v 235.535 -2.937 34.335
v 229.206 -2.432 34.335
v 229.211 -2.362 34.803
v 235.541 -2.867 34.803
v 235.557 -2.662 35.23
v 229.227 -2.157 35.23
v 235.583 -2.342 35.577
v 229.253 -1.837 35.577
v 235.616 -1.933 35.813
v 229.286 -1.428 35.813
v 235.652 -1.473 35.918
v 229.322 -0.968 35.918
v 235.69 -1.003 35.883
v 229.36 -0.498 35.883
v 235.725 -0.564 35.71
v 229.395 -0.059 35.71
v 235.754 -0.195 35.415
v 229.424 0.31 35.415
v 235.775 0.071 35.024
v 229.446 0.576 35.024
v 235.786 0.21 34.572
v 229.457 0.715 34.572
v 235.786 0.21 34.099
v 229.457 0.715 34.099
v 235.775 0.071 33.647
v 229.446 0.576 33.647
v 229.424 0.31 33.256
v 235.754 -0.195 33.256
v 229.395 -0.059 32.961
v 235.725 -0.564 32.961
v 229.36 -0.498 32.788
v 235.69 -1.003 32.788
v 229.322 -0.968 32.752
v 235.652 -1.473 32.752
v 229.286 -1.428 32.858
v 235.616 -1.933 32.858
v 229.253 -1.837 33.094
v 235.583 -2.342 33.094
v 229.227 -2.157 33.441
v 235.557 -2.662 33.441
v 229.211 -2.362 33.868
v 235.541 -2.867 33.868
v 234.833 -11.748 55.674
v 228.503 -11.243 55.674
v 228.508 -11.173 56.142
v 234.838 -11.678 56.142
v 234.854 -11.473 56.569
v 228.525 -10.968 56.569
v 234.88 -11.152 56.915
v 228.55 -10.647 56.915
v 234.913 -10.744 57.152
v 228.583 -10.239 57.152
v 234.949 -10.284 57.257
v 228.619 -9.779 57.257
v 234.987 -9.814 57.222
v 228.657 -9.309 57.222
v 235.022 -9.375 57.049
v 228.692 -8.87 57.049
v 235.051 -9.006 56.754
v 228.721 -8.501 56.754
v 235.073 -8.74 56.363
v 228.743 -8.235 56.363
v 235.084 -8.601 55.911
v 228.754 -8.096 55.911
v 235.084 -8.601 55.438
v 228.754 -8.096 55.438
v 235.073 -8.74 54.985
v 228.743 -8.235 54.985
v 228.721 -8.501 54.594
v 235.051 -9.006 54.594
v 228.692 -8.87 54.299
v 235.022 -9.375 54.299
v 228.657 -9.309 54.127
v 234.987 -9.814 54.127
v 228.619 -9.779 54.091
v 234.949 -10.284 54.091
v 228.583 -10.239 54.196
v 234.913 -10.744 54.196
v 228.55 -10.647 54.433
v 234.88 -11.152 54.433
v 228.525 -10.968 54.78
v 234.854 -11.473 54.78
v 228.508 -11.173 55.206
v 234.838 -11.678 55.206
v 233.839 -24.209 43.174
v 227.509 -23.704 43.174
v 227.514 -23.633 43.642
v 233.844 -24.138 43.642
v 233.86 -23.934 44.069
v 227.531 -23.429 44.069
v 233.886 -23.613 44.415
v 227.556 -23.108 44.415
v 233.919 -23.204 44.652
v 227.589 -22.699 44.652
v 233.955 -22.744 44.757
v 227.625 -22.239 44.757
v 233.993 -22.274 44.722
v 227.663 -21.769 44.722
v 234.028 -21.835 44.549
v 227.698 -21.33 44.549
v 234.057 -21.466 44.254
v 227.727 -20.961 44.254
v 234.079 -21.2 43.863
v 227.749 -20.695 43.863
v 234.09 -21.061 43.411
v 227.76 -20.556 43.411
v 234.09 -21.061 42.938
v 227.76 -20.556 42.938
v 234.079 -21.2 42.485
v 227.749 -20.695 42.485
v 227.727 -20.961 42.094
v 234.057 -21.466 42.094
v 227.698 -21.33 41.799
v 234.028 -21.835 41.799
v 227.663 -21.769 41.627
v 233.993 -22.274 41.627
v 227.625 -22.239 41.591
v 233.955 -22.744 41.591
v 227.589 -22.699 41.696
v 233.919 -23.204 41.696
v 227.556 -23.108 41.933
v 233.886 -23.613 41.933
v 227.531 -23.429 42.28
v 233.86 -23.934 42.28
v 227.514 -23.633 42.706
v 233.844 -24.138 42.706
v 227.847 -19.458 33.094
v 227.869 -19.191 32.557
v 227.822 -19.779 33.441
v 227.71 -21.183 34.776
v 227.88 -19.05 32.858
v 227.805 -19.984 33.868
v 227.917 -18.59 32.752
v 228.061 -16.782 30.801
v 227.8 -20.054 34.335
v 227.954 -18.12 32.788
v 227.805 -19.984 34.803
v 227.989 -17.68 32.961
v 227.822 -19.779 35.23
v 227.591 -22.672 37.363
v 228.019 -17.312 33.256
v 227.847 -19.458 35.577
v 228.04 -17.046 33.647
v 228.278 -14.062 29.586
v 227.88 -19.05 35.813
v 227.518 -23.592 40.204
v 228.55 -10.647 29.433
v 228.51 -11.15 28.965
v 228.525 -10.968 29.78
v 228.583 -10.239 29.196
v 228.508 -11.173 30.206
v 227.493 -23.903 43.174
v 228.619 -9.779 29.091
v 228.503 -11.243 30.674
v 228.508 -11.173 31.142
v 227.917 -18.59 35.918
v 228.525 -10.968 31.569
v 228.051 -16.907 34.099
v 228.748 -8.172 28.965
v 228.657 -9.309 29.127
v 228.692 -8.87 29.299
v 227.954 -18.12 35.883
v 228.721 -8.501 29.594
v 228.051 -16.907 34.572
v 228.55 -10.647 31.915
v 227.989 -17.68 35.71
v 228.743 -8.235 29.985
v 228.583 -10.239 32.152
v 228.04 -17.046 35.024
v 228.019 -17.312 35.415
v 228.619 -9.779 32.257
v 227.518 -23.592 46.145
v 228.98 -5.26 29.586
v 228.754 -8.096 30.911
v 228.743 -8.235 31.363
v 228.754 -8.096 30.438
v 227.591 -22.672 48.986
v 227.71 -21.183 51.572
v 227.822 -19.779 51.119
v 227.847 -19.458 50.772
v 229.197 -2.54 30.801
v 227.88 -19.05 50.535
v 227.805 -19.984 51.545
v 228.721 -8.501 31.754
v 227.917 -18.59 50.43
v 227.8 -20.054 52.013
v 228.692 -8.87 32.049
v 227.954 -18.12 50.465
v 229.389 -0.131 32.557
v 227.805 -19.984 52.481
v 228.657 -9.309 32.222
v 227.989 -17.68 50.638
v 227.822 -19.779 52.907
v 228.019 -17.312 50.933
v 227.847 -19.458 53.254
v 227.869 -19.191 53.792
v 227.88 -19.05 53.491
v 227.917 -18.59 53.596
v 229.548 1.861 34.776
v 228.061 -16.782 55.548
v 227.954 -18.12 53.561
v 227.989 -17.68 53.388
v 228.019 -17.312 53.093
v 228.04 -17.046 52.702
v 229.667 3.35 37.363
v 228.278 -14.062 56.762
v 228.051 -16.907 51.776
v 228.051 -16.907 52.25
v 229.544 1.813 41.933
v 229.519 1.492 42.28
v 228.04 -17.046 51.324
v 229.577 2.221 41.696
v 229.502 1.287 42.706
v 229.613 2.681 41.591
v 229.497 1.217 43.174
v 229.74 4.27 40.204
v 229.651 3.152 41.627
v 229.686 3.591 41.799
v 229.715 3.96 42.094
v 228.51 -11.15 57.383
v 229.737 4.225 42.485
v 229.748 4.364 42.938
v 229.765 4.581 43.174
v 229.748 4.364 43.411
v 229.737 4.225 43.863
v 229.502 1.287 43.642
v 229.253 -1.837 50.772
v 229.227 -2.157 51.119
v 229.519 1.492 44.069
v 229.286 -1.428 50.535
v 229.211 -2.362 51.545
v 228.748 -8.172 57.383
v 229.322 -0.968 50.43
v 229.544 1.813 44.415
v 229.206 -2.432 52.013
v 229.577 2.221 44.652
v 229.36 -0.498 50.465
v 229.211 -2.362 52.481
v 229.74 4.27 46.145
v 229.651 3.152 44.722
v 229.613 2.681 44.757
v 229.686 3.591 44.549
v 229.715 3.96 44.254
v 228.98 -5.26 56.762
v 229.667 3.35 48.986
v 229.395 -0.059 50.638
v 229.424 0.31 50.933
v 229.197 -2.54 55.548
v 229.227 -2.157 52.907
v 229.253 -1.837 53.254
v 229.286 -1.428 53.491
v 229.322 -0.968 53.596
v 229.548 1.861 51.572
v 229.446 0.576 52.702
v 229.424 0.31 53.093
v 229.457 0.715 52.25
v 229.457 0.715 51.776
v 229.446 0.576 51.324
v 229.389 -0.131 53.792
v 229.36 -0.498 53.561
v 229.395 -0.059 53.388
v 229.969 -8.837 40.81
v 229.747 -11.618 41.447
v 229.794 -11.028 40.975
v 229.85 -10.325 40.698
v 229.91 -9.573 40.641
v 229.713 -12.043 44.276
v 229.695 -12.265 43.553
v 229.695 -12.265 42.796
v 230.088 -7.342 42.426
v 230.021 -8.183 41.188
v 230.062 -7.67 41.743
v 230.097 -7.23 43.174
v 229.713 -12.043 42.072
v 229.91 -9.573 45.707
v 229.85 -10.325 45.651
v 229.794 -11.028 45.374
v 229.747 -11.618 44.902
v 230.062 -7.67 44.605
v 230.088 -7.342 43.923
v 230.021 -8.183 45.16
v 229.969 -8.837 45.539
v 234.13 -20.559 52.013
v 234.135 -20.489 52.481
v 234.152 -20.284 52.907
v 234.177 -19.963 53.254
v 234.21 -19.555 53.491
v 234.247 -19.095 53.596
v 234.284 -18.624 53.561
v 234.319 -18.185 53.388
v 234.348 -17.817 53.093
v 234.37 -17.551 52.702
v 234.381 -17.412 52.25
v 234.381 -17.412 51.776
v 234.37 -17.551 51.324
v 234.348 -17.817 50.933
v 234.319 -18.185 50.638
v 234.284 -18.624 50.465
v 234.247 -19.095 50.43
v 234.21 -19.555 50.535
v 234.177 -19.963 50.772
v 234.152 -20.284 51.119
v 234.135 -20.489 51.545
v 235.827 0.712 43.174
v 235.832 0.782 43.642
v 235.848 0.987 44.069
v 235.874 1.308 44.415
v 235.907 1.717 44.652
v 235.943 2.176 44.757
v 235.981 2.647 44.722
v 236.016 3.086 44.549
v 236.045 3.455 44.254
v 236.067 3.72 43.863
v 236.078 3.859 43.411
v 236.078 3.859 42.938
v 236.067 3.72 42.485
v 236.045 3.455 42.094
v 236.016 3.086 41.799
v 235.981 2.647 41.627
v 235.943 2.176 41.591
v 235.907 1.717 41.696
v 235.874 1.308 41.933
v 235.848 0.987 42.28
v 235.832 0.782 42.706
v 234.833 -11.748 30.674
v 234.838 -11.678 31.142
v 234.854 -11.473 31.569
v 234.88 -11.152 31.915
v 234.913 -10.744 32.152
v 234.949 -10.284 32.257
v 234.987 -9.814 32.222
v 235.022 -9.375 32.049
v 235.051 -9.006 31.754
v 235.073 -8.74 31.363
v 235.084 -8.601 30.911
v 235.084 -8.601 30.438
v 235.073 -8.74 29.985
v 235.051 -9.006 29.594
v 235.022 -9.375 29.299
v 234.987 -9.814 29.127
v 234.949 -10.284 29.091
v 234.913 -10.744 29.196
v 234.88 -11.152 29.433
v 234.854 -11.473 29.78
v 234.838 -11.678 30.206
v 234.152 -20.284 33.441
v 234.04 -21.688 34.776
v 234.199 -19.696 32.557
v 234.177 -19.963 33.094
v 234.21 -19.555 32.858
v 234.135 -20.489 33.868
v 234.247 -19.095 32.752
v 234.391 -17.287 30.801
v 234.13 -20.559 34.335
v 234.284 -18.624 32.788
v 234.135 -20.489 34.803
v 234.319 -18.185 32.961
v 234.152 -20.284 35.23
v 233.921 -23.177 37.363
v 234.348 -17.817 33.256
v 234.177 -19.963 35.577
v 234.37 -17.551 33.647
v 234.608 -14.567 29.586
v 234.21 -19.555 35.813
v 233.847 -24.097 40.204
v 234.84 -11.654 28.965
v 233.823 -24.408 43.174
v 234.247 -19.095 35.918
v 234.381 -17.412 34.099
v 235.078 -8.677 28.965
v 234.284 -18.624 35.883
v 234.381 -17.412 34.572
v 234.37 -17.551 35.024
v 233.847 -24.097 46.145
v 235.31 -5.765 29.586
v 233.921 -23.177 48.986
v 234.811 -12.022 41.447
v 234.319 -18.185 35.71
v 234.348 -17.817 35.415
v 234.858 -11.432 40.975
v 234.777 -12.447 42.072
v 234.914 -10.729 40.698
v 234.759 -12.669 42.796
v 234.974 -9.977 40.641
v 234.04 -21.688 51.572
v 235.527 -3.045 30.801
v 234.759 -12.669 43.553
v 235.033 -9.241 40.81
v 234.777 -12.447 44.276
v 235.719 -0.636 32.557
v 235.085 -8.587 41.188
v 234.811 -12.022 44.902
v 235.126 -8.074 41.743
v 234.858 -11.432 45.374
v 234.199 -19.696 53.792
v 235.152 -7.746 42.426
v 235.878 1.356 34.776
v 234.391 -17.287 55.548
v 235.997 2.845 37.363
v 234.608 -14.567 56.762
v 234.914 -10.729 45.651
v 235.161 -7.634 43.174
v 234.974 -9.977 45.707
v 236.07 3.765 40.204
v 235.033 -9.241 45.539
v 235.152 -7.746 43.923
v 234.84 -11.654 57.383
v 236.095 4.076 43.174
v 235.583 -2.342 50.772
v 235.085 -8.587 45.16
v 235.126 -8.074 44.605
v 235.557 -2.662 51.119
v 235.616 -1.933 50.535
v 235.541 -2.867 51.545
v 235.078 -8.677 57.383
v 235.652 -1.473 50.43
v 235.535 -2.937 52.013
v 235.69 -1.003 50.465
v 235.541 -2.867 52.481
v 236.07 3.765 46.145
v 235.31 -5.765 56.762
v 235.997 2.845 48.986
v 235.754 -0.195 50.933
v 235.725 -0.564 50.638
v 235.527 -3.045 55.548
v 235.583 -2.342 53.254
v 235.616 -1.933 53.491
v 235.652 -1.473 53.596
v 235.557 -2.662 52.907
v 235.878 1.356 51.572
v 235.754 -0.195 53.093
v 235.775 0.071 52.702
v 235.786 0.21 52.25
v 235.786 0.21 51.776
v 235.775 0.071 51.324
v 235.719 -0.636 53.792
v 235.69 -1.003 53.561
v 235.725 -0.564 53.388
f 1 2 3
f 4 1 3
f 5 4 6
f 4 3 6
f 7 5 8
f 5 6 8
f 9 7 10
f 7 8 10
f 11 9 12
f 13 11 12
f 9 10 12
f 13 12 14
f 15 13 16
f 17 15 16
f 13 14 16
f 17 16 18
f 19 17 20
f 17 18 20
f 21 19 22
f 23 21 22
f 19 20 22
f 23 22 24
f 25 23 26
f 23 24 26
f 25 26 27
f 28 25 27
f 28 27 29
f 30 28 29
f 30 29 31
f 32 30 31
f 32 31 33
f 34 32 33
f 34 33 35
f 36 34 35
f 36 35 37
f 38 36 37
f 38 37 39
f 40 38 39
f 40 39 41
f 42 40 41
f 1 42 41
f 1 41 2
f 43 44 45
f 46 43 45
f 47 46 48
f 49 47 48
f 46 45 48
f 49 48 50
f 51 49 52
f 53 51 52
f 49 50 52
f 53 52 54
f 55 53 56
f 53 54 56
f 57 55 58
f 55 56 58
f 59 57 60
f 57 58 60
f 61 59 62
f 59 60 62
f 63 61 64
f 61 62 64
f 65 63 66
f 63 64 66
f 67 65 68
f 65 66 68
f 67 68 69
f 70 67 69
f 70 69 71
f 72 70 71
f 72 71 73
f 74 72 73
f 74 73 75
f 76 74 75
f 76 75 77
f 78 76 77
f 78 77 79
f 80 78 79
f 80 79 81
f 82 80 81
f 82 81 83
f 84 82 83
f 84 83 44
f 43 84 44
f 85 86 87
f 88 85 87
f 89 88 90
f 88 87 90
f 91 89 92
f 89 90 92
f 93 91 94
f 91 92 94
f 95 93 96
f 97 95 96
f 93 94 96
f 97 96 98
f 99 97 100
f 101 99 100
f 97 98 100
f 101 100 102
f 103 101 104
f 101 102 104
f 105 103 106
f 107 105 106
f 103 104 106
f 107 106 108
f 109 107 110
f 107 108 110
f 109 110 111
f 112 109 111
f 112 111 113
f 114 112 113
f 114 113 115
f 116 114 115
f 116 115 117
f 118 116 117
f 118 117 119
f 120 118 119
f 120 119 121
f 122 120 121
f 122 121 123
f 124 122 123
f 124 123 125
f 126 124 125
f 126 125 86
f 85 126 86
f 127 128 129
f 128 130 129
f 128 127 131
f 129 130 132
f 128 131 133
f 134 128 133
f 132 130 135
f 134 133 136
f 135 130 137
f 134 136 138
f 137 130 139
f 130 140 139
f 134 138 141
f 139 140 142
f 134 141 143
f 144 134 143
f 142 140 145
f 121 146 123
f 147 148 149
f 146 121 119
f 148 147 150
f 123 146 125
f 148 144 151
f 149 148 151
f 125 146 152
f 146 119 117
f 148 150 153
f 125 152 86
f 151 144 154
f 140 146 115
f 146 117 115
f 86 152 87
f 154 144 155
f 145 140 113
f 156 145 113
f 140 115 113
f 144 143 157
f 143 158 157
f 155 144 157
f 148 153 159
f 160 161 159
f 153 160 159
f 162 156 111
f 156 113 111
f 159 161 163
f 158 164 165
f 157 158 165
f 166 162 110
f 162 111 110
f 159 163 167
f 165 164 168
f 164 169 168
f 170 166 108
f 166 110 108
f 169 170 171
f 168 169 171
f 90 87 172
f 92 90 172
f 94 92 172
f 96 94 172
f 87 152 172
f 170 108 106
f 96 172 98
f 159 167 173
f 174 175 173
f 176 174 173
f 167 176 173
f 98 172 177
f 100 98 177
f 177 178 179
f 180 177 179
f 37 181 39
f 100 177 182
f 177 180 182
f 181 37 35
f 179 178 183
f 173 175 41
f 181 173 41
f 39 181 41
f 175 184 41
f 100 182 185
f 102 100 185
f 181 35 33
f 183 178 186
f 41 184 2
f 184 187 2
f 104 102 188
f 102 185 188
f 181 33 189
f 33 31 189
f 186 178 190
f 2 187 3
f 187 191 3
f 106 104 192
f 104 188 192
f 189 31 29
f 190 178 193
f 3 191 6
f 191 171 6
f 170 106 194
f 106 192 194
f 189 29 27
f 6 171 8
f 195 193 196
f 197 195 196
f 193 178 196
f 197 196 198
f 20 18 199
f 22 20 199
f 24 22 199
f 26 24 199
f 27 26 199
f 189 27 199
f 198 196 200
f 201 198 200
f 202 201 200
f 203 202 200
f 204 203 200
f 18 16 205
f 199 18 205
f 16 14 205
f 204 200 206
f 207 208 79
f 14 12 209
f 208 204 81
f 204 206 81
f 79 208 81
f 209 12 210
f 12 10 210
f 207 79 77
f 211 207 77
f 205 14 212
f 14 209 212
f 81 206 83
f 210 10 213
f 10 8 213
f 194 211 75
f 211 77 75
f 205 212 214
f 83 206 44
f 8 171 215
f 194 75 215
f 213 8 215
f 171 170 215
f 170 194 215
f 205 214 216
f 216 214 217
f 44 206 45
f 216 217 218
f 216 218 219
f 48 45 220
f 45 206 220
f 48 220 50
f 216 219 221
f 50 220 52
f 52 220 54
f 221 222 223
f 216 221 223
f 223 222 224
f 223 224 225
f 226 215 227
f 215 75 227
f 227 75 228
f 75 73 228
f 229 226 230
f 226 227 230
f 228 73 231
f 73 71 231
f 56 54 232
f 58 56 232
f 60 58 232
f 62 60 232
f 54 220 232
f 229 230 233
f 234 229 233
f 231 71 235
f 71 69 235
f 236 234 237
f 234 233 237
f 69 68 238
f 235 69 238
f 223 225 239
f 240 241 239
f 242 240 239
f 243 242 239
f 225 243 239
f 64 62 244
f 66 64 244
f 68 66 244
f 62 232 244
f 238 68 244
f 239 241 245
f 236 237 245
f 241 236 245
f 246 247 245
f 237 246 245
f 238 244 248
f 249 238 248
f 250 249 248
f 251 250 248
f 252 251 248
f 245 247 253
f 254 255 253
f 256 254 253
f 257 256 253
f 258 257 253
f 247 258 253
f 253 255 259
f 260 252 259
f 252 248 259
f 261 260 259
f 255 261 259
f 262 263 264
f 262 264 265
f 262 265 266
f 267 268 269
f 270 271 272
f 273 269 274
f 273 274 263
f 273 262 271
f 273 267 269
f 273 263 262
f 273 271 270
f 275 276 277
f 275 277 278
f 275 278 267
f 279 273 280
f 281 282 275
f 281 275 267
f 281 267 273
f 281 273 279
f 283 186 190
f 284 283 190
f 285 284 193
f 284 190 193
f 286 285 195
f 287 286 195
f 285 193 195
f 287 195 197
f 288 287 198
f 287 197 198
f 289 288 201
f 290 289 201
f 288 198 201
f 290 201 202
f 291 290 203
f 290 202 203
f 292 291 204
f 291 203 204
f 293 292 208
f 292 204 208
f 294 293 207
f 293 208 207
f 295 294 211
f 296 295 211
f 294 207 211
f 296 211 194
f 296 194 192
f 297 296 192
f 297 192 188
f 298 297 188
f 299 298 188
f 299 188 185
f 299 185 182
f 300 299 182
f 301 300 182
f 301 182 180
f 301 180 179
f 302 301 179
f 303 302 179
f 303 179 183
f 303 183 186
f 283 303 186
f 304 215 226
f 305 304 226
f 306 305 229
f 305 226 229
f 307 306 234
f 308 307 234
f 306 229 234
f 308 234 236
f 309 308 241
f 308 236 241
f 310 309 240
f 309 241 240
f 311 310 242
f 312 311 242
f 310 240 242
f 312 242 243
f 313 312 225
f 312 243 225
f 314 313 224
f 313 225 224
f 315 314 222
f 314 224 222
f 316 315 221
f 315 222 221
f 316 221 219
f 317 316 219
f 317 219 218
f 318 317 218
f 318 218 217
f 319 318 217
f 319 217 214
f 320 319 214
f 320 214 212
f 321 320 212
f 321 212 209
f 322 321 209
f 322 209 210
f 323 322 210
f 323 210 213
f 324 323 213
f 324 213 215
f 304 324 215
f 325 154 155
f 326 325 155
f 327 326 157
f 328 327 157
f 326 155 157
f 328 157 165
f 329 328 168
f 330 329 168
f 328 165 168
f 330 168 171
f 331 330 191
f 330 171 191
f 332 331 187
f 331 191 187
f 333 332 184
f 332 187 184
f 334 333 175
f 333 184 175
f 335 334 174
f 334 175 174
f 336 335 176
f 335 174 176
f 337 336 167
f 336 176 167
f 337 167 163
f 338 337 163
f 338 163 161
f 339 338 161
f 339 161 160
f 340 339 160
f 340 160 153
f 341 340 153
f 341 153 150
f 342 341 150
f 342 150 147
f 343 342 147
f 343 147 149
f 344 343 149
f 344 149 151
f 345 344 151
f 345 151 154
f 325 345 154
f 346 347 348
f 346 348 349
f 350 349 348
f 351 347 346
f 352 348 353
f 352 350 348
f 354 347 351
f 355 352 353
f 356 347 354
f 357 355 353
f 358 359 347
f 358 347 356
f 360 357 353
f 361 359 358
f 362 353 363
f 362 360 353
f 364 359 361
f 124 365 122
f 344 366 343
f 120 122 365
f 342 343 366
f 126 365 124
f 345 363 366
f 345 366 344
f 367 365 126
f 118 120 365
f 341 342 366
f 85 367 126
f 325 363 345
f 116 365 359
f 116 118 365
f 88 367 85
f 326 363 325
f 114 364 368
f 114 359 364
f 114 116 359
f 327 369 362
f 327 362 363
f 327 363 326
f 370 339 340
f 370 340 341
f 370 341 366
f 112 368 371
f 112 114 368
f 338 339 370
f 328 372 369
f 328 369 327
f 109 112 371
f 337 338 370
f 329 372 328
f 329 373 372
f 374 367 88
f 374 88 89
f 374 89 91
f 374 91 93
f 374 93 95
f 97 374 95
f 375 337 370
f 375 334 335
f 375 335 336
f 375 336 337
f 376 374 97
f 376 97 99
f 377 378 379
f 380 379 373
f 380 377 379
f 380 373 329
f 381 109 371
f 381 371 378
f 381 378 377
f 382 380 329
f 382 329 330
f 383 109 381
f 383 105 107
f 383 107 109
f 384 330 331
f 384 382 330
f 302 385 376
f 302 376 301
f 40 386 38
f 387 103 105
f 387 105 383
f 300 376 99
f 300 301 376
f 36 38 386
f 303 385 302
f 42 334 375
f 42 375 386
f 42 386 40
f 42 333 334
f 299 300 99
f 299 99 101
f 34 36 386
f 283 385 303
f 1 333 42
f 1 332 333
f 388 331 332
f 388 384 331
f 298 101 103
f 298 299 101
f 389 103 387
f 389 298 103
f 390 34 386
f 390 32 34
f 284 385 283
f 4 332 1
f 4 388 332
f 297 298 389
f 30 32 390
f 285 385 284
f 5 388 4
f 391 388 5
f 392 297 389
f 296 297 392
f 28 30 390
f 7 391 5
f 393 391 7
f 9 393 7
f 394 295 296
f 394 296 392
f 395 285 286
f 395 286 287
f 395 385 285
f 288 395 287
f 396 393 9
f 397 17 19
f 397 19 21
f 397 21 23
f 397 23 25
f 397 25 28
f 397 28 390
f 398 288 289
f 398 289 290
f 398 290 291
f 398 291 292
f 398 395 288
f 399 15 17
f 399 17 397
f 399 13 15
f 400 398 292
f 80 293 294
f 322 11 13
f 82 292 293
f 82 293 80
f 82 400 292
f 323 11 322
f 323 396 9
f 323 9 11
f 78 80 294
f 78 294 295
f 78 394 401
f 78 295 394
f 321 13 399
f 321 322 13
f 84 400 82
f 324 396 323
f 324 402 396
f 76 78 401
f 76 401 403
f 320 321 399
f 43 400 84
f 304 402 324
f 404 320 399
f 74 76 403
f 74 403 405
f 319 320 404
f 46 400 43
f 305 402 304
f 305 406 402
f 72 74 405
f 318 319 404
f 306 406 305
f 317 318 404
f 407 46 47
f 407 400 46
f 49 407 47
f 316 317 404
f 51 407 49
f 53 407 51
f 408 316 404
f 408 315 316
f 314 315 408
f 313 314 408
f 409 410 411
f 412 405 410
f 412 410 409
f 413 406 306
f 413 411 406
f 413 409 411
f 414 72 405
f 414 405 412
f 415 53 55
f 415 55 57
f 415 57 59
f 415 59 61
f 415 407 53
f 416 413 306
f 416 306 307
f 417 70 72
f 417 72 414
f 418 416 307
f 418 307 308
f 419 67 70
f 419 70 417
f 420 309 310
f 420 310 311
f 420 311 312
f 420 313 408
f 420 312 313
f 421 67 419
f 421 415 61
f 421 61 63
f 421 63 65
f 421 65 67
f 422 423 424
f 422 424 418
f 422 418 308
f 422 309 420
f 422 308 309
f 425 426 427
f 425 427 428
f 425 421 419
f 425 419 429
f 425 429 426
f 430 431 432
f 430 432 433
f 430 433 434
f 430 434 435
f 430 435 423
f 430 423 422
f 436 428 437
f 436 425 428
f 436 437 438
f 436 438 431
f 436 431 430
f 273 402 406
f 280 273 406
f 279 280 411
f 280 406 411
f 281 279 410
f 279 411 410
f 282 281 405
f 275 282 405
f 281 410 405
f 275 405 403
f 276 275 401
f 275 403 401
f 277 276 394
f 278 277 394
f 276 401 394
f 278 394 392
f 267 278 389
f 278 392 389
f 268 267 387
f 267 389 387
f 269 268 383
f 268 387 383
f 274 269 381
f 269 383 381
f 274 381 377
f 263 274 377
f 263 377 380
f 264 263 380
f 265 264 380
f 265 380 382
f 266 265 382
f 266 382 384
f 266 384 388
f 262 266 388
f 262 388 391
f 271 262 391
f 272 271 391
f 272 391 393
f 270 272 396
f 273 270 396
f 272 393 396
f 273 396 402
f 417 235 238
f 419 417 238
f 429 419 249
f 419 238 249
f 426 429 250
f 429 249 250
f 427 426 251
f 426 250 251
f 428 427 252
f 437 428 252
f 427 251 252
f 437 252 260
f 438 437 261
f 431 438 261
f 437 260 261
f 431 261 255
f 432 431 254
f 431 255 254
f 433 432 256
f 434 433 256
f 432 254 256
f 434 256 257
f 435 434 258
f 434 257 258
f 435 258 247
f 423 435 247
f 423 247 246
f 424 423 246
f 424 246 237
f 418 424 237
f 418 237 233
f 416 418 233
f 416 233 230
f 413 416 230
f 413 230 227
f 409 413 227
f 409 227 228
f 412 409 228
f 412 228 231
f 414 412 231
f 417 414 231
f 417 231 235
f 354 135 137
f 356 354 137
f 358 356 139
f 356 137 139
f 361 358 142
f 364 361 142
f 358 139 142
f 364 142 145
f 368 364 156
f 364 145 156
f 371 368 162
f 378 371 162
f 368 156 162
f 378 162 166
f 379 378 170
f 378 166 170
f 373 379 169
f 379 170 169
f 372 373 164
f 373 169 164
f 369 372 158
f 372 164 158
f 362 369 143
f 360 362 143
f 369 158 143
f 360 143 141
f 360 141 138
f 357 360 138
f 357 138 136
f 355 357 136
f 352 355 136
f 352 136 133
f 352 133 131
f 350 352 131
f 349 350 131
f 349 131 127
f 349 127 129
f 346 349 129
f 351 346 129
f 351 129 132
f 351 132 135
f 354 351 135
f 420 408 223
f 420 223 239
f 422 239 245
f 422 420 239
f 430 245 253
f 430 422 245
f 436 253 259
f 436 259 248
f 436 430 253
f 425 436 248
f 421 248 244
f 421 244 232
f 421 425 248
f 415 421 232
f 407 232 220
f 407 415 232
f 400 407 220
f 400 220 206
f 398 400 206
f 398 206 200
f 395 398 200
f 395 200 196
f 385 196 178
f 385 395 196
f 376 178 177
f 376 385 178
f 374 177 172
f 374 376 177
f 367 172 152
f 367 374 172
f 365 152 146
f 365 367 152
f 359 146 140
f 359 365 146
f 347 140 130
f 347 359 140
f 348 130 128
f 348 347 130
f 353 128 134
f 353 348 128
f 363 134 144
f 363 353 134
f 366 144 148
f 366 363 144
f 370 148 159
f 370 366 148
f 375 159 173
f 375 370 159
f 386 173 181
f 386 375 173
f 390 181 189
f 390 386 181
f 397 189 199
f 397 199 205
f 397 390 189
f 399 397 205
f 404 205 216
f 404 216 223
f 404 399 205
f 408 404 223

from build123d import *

# Parameters (mm, degrees)
SKETCH1_R           = 14.2875
BOSS_EXTRUDE1_DEPTH = 6.35
SKETCH2_R           = 2.54
CUT_EXTRUDE1_DEPTH  = 5.08
SKETCH3_R           = 1.5875
CUT_EXTRUDE2_DEPTH  = 10


with BuildPart() as part:
    # Sketch1 → Boss-Extrude1 (new body)
    with BuildSketch(Plane(origin=(234.278878836, -18.689027227, 0), x_dir=(0, 0, -1), z_dir=(0.9968332748770866, -0.0795199477981641, 0))):
        with Locations(Location((-43.174261814, 8.550344032, 0), (0, 0, 90))):
            Circle(SKETCH1_R)
    extrude(amount=-BOSS_EXTRUDE1_DEPTH)

    # Sketch2 → Cut-Extrude1 (cut)
    with BuildSketch(Plane(origin=(234.278878836, -18.689027227, 0), x_dir=(0, 0, -1), z_dir=(0.9968332748770866, -0.07951994779816411, 0))):
        with Locations(Location((-43.174261814, 8.550344032, 0), (0, 0, 90))):
            Circle(SKETCH2_R)
    extrude(amount=-CUT_EXTRUDE1_DEPTH, mode=Mode.SUBTRACT)

    # Sketch3 → Cut-Extrude2 (cut)
    with BuildSketch(Plane(origin=(227.94898754, -18.184075559, 0), x_dir=(0, 0, 1), z_dir=(-0.9968332748770866, 0.07951994779816411, 0))):
        with Locations(Location((30.674261814, 8.550344032, 0), (0, 0, 270))):
            Circle(SKETCH3_R)
        with Locations(Location((43.174261814, 21.050344032, 0), (0, 0, 270))):
            Circle(SKETCH3_R)
        with Locations(Location((52.013096579, 17.389178797, 0), (0, 0, 270))):
            Circle(SKETCH3_R)
        with Locations(Location((55.674261814, 8.550344032, 0), (0, 0, 270))):
            Circle(SKETCH3_R)
        with Locations(Location((52.013096579, -0.288490733, 0), (0, 0, 270))):
            Circle(SKETCH3_R)
        with Locations(Location((43.174261814, -3.949655968, 0), (0, 0, 270))):
            Circle(SKETCH3_R)
        with Locations(Location((34.33542705, -0.288490733, 0), (0, 0, 270))):
            Circle(SKETCH3_R)
        with Locations(Location((34.33542705, 17.389178797, 0), (0, 0, 270))):
            Circle(SKETCH3_R)
    extrude(amount=-CUT_EXTRUDE2_DEPTH, mode=Mode.SUBTRACT)


solid = part.part
